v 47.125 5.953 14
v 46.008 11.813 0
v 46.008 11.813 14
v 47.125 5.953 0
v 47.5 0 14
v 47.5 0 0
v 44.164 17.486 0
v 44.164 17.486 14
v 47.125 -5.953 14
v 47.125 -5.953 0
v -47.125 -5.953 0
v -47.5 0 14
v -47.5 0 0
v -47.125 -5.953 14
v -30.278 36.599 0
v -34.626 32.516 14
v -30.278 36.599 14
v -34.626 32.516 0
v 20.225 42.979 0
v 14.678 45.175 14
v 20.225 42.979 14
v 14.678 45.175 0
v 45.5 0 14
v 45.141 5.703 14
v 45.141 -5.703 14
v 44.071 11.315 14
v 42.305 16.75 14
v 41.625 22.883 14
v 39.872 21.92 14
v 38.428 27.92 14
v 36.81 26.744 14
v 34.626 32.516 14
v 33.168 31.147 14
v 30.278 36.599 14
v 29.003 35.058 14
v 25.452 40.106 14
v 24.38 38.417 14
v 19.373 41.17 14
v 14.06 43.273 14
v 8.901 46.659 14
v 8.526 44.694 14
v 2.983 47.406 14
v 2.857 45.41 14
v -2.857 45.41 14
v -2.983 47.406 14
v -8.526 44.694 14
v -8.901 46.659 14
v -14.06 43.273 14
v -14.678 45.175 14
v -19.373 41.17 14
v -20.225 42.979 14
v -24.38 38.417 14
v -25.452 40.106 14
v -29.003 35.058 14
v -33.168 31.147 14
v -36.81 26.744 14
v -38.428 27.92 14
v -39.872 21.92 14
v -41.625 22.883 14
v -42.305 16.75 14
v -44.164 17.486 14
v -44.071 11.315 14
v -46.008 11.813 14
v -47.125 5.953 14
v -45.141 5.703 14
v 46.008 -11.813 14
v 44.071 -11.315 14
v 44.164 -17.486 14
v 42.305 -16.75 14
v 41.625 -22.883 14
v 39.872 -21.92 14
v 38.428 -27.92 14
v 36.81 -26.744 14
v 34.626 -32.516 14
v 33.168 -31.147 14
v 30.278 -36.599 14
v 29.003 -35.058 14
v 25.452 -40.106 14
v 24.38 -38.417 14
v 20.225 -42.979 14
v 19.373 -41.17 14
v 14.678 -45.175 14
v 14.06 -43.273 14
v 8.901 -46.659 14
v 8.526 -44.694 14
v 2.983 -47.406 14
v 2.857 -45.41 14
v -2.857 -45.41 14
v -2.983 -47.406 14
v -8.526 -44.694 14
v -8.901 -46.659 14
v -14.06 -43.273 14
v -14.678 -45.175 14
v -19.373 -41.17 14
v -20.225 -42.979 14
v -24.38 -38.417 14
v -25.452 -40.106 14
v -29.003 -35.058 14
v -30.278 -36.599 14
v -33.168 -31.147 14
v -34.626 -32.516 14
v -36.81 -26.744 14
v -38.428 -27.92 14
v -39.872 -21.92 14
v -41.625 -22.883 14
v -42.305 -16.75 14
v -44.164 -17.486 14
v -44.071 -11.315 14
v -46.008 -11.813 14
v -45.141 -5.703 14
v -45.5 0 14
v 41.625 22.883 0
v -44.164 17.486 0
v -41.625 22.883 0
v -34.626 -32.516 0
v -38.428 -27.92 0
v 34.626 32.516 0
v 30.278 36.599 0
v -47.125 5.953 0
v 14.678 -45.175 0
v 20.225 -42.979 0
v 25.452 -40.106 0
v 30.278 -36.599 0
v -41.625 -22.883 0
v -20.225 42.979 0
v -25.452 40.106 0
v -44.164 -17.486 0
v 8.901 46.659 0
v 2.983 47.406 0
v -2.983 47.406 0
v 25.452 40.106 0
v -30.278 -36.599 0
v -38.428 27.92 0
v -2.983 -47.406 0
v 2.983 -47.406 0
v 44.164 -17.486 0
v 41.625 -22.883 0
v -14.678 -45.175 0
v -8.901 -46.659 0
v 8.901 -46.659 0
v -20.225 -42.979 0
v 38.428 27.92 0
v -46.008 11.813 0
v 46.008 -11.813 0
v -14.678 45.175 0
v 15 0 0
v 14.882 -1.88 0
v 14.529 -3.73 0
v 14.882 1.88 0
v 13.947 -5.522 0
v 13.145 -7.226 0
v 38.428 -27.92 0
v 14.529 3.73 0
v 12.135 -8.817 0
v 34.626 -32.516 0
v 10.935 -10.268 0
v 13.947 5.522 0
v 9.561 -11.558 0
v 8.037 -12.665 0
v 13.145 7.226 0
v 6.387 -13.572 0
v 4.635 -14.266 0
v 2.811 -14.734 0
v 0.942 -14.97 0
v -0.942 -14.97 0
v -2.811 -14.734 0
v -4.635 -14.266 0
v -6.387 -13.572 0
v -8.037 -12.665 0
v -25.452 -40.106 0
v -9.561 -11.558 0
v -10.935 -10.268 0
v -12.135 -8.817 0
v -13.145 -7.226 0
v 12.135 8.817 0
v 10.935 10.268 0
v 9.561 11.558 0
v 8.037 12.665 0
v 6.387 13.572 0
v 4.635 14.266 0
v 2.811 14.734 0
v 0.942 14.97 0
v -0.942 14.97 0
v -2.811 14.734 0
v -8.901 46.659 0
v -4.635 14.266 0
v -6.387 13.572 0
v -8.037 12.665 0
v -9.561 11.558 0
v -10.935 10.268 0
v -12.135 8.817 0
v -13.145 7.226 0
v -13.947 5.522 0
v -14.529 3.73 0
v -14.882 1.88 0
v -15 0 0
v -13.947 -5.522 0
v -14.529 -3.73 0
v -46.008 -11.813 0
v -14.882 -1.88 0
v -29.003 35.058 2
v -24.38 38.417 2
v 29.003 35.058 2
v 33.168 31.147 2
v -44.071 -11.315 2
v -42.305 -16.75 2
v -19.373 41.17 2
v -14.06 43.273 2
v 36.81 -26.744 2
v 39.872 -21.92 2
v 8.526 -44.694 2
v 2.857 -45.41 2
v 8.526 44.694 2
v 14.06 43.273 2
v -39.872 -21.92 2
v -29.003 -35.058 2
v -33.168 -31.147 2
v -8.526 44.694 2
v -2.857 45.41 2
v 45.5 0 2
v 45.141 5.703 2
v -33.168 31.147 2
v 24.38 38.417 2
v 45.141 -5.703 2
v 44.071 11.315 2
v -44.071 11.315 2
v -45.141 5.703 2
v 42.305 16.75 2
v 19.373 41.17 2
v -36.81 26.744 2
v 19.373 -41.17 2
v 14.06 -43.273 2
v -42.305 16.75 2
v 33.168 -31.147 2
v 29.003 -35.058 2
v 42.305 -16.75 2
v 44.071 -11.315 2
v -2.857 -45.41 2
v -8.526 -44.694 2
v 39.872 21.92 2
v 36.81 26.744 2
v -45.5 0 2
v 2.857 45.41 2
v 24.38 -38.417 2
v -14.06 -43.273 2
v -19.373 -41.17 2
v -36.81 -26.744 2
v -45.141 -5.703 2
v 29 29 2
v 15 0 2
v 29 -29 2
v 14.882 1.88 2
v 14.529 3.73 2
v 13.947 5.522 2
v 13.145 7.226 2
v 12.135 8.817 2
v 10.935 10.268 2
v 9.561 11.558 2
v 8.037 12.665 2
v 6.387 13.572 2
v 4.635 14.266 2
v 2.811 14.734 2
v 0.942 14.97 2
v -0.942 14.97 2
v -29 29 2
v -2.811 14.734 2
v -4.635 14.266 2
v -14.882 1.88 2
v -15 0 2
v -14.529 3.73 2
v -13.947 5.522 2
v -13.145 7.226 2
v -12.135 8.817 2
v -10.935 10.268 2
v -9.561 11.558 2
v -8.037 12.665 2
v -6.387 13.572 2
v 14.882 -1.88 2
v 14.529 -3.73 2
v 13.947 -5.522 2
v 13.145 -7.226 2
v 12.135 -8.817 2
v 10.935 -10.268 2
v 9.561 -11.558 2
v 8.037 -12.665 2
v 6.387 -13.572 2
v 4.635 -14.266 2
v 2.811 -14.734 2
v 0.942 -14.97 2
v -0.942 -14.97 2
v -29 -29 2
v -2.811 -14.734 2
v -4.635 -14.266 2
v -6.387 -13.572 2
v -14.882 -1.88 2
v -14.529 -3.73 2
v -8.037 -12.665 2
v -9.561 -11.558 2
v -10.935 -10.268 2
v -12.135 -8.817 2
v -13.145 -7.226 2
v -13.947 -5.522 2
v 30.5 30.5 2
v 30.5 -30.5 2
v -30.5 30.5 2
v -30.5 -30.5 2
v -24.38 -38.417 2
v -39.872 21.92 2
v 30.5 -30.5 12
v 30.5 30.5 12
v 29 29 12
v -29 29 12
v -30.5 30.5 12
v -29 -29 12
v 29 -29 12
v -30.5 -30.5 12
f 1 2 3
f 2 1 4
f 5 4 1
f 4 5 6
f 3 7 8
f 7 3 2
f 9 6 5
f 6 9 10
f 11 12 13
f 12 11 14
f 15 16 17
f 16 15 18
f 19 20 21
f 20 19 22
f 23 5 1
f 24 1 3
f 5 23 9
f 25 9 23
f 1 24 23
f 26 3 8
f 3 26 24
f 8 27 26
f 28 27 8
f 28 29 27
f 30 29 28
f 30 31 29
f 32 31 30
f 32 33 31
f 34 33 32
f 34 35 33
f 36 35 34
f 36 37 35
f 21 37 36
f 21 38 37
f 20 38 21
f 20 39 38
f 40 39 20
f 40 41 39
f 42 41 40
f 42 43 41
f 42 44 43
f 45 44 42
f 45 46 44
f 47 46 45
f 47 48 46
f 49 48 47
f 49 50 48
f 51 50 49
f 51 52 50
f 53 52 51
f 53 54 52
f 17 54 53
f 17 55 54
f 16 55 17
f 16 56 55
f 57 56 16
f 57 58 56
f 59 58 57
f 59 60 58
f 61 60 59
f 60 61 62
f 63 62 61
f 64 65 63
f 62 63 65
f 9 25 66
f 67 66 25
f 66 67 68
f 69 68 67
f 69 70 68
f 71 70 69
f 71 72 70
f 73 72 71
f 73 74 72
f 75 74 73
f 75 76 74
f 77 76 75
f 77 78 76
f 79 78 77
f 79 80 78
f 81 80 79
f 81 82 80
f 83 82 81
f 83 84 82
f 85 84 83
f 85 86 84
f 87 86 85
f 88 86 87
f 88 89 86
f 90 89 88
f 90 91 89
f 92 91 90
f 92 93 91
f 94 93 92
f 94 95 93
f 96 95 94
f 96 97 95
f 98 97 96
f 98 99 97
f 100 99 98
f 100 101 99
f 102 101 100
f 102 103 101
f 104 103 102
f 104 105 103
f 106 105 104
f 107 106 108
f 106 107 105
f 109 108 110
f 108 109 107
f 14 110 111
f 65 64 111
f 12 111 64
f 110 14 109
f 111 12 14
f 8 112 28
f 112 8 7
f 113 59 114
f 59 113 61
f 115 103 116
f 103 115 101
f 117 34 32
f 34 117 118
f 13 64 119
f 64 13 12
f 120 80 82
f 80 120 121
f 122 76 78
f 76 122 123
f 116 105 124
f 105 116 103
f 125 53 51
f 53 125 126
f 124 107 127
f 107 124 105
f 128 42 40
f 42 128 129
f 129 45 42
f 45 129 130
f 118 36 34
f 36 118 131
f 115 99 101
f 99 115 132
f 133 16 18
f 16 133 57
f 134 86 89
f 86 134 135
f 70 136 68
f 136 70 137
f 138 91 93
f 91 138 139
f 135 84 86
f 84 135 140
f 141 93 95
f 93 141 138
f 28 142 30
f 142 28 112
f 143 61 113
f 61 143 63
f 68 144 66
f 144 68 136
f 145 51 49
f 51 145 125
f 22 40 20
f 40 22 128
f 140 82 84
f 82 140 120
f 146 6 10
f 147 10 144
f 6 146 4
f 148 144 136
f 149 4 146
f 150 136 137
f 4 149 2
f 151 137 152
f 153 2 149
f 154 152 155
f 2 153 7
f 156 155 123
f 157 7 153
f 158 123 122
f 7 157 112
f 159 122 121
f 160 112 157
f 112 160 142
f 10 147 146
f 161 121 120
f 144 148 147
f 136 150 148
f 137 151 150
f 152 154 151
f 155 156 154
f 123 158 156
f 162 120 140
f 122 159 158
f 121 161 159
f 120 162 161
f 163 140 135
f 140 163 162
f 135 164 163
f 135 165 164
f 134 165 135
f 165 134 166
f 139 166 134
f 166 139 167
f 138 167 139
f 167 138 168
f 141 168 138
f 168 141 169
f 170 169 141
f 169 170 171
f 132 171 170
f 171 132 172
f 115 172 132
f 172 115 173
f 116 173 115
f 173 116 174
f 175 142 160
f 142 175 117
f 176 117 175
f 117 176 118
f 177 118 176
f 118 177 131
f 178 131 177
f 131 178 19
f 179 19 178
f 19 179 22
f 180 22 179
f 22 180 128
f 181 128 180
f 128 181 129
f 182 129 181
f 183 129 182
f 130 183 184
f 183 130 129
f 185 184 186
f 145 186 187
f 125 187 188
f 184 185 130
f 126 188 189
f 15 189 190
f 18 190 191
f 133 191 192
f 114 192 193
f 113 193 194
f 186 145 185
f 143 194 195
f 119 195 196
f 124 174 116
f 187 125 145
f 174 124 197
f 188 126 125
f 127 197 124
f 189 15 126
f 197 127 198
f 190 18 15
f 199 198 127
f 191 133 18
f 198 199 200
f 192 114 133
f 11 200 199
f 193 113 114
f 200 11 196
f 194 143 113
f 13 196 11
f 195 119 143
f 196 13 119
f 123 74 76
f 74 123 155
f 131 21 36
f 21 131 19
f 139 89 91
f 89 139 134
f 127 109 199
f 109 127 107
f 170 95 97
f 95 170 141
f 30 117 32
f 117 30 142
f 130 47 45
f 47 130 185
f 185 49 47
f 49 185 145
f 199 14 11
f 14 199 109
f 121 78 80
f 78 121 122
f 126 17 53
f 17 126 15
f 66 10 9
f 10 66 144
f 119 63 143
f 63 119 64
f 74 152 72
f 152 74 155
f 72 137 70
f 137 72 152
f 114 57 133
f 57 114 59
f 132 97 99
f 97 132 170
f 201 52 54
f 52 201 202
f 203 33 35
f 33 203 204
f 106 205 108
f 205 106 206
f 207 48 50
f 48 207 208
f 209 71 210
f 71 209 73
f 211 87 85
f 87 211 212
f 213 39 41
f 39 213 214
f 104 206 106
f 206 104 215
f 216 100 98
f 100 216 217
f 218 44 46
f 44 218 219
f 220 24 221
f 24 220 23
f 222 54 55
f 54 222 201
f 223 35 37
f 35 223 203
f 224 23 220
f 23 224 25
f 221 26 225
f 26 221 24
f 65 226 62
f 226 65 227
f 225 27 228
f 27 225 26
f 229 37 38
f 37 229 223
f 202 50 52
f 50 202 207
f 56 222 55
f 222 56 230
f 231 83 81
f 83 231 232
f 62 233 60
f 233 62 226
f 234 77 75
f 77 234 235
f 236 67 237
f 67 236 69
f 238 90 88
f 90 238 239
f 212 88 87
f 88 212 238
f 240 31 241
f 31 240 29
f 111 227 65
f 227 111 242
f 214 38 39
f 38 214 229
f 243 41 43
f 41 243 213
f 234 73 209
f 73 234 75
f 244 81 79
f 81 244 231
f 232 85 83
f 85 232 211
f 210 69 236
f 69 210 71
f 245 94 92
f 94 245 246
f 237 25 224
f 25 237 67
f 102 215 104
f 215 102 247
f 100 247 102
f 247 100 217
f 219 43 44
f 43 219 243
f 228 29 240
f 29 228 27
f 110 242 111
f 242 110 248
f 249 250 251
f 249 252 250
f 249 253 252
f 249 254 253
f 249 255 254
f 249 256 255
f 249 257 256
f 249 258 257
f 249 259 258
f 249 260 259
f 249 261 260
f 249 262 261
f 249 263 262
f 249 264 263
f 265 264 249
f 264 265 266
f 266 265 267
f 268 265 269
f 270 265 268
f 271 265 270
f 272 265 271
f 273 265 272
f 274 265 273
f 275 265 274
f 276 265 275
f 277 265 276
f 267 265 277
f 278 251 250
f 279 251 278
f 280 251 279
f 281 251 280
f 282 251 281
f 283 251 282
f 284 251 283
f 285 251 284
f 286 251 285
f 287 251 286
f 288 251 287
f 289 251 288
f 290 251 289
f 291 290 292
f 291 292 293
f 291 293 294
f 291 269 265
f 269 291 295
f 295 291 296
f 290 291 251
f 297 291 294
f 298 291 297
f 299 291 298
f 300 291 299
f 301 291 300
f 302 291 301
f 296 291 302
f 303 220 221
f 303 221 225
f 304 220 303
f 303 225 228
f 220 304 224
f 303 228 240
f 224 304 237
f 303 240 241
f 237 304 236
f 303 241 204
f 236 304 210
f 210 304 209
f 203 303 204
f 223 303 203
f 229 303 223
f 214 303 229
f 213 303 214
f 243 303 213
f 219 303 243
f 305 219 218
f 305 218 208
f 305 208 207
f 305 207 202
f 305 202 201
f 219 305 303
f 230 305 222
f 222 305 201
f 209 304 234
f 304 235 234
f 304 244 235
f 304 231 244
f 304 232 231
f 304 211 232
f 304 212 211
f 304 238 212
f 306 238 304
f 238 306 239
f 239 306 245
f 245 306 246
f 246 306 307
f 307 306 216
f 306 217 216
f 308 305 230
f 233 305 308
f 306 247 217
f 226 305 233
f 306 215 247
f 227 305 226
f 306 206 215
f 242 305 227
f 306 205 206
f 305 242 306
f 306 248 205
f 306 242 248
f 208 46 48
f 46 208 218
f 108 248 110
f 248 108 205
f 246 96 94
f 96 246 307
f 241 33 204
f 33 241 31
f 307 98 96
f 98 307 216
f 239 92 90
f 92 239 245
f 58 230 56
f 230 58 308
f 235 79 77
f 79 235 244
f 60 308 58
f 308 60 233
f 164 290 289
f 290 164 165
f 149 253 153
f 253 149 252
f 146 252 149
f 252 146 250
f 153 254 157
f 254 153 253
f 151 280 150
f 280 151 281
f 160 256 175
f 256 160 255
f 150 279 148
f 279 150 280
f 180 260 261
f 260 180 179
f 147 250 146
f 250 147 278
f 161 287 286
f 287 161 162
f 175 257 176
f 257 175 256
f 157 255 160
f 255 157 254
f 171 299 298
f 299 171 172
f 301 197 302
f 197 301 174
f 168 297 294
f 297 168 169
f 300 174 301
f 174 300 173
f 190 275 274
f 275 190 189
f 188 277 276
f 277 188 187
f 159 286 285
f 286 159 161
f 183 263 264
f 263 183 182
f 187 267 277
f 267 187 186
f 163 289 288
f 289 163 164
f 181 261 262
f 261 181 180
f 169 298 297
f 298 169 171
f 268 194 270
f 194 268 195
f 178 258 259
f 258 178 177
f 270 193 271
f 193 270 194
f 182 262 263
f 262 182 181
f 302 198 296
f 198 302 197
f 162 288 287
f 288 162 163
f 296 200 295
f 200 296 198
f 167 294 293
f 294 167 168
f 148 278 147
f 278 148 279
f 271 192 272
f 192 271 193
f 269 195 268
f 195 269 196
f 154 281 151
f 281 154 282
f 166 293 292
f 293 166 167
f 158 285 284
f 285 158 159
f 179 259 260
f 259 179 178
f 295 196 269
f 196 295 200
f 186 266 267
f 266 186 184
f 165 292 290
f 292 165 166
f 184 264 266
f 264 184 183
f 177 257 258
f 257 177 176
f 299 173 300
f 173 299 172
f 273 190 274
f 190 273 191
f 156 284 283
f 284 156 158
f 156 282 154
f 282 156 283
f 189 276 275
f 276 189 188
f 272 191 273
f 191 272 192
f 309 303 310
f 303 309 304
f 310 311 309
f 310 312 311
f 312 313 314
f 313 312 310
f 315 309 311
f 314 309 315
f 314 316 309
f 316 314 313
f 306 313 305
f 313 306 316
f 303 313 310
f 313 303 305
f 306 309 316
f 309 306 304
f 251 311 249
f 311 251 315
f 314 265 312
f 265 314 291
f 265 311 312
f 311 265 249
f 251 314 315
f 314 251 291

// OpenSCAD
part = "2"; // [1: Clock Face, 2:Clockwork Bracket, 3:Diffusor Bracket, 4:Diffusor Panel, 5:Diffusor Seam, 6: Diffusor Seam with cable hole]


//in mm
diameter = 200; // [150:300]

//hole diameter in mm
core_inner = 95; // [50:150]

//diameter in mm (The surface that the Filament sits on)
core_outer = 100; // [82:152]

//in mm (Measure only the slot, not the walls of the spool!)
spool_width = 62; // [40:100] 


//in mm
clockwork_size = 56; // [30:80]



print_part();


module print_part(){
    
    if (part == "1") {
        clockface();
    }
    else if (part == "2") {
        clockwork();
    }
    else if (part == "3") {
        diff_bracket();
    }
    else if (part == "4") {
        diff_panel();
    }
    else if (part == "5") {
        diff_seam();
    }
    else if (part == "6") {
        diff_seam_02();
    }  
    }




module clockface() {

union() {

difference()   {
    $fn = 50;
    cylinder(2,d = diameter- 1, d = diameter-1);
    
    translate([0,0,-0.5])cylinder(3, d = diameter - 10, d = diameter-10);
    
               }
               
for (i = [1:60]) {
    rotate(a = i * 6, v = [0, 0, 1])translate([-1, diameter/2-10 , 0]) cube([2,6,2]);
                 }
 
for (i = [1:12])  {
    rotate(a = i * 360/12, v = [0, 0, 1])translate([-2, diameter/2-13 , 0]) cube([4,9,2]);
                 }
       }}






module clockwork() {
    
union() {

difference() {

$fn = 50;

cylinder(14, d = core_inner, d = core_inner);

translate ([0, 0, 2]) cylinder(14, d = core_inner- 4, d = core_inner - 4);
    
difference() {
    translate([0, 0, -2]) cylinder(15, 15, 15);
    
    }}
    
difference() {
    translate([-(clockwork_size+5)/2,-(clockwork_size+5)/2,0]) cube(size = [clockwork_size+5,clockwork_size+5,12]);
    translate([-(clockwork_size+2)/2,-(clockwork_size+2)/2,2]) cube([clockwork_size+2,clockwork_size+2,20]);
    
$fn = 50;
    
difference() {
    translate([0, 0, -2]) cylinder(15, 15, 15);
            }}}}
            
            



module diff_bracket() {

    
difference() {
           
        
intersection() {
    translate([1,1,0]) cube([diameter,diameter,diameter]);

    difference() {
        $fn = 50;
        difference() {
            cylinder(4, d = diameter-4, d = diameter-4);
            translate ([0,0,1]) cylinder(4.1, d = diameter-6, d =   diameter-6);
            }
        translate([0,0,-1]) cylinder(5, d =  core_outer+0.5 , d = core_outer+0.5);
        }}
        
intersection() {
        translate([15,15,-1]) cube([diameter, diameter, diameter]);
        $fn = 50;
    difference() {
        translate([0,0,-1])cylinder(diameter+2, d = diameter-30, d = diameter-30);
    difference() {
        translate([0,0,-1]) cylinder( diameter+2, d = core_outer+30, d = core_outer+30);
        
    }}}}}
           




module diff_panel() {

cube(size = [spool_width-1, diameter* 3.1415/4-4, 0.21]);
    
                    }
                    
                    
                    
module diff_seam() {
    
cube([spool_width, 5, 2]);
    
                   }


module diff_seam_02() {
    
difference() {
    
union() {

cube([spool_width, 5, 2]);

translate([0,-2,0]) cube([9, 9, 2]);
    
        }
    
translate([-0.01,0,-2])cube([6,5,10]);
            }}
